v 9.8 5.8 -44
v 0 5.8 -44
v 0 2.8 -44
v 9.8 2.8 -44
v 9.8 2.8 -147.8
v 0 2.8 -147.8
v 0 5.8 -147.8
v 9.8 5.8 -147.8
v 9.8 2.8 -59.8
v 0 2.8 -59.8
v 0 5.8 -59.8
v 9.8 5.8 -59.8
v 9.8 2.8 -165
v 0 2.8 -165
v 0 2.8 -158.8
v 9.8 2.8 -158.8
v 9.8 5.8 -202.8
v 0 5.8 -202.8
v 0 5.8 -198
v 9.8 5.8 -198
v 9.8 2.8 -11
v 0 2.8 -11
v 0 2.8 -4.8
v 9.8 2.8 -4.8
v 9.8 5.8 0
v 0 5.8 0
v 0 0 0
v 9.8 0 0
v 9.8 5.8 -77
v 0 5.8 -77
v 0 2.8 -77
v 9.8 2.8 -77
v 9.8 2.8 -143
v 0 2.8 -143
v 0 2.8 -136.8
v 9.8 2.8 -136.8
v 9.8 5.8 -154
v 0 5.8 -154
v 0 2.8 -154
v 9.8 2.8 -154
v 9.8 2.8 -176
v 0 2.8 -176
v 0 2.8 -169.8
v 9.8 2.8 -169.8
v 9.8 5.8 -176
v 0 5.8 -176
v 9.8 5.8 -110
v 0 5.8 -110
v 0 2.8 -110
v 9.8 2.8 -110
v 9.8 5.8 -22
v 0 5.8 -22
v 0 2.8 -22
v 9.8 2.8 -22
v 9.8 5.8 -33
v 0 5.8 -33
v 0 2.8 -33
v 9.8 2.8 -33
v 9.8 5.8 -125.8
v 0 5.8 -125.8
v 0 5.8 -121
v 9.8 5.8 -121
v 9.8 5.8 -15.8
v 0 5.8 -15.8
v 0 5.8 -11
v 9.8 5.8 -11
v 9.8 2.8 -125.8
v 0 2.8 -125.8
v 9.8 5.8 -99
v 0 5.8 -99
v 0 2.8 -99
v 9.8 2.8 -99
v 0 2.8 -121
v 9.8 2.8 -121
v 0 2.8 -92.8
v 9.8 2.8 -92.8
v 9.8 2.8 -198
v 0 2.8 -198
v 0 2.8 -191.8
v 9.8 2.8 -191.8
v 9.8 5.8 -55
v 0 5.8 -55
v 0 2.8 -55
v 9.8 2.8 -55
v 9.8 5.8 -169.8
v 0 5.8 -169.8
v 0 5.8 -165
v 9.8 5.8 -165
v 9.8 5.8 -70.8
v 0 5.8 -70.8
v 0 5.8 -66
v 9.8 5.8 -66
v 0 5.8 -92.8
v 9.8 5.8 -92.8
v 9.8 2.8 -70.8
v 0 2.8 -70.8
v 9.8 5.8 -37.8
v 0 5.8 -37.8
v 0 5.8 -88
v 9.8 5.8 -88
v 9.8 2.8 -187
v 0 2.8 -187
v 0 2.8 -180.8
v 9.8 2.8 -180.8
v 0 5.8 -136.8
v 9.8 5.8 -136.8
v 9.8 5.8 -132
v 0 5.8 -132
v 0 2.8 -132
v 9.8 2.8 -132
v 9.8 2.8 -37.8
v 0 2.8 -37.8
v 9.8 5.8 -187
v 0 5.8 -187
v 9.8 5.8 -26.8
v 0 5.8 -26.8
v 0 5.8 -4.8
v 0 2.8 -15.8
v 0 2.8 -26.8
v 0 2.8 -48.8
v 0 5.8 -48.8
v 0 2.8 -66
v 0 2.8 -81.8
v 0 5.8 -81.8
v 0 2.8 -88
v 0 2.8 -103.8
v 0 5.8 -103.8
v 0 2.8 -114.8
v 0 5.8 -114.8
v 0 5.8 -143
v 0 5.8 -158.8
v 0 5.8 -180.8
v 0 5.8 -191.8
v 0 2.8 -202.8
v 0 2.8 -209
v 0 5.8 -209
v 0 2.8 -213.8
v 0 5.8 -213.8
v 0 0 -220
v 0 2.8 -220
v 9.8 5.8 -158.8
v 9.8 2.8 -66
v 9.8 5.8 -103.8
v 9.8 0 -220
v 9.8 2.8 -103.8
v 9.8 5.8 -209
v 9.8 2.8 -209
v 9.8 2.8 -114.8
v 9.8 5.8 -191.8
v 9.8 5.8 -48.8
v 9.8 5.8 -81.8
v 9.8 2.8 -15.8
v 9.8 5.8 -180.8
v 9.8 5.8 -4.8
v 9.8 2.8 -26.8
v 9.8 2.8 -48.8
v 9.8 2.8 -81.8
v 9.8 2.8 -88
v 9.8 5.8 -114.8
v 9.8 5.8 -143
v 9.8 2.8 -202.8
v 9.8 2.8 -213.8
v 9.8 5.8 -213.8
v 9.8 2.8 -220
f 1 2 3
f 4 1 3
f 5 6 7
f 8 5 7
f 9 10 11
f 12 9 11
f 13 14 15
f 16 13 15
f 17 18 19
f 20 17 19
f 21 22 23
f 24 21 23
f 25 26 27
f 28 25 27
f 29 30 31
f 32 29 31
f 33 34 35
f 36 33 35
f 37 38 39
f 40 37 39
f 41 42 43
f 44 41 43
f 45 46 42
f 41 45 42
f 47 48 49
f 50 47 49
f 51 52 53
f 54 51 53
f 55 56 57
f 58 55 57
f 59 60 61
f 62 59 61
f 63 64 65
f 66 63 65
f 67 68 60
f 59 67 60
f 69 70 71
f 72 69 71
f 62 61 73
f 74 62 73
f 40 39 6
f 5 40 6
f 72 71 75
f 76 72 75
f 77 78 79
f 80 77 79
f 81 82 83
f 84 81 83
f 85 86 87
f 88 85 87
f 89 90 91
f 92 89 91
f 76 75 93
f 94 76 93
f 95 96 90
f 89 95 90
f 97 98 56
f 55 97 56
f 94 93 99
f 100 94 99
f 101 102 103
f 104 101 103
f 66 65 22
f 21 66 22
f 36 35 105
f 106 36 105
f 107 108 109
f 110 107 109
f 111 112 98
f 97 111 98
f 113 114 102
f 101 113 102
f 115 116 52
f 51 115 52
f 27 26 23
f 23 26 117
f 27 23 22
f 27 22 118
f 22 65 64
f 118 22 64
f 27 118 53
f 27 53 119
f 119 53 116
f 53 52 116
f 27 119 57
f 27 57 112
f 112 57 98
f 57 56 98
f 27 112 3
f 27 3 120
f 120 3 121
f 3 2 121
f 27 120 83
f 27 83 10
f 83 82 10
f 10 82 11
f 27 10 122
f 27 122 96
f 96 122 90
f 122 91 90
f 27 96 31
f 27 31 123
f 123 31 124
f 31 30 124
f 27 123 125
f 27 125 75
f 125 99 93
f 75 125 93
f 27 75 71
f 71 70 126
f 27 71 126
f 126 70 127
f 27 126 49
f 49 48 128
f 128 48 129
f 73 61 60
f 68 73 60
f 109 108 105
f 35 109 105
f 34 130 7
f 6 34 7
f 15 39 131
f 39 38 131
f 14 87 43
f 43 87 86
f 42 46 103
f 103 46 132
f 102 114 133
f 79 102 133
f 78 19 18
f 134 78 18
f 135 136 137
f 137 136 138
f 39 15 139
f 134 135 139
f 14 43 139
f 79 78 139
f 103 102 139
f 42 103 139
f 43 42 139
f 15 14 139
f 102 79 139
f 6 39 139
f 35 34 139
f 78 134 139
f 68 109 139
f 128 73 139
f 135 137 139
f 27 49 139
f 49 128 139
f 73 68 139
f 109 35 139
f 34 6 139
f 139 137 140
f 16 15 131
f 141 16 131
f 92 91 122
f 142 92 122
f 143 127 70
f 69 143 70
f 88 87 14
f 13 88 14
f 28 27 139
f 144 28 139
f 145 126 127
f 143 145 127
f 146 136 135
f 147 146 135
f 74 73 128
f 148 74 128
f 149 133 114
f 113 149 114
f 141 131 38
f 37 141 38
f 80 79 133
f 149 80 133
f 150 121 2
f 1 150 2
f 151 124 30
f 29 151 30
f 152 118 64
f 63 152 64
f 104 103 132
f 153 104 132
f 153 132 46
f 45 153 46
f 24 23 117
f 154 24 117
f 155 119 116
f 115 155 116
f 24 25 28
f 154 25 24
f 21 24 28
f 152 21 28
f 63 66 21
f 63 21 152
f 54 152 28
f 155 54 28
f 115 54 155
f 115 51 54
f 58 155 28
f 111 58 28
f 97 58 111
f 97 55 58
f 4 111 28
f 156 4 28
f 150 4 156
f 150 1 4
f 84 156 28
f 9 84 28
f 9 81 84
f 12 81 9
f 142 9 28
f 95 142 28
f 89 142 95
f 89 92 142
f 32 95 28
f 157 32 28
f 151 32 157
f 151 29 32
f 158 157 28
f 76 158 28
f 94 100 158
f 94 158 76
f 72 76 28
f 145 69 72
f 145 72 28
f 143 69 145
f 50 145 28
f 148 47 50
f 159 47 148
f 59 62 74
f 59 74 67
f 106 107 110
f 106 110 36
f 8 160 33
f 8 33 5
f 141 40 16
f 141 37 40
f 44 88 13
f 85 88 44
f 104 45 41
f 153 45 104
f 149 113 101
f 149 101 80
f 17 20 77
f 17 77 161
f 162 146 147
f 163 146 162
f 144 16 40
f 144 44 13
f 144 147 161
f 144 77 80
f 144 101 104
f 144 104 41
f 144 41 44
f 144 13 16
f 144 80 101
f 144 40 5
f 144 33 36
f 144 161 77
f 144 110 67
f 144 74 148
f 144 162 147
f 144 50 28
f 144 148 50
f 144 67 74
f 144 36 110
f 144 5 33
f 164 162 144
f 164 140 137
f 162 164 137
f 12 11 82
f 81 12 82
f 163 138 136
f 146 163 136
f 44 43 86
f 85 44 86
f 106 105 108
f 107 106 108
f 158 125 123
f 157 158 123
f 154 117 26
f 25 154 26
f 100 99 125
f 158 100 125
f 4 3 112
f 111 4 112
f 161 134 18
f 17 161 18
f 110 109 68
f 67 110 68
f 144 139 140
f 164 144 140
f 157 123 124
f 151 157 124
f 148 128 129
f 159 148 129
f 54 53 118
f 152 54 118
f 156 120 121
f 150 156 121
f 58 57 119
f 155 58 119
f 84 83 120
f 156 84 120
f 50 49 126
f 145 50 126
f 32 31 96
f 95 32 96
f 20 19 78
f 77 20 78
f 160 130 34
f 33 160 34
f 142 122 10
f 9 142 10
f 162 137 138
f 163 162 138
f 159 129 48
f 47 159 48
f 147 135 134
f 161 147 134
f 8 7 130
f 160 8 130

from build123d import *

# Parameters (mm, degrees)
BOSS_EXTRUDE1_DEPTH = 9.8
LPATTERN1_COUNT     = 20
LPATTERN1_PITCH     = 11


with BuildPart() as part:
    # Sketch1 → Boss-Extrude1 (new body)
    with BuildSketch(Plane(origin=(0, 0, 0), x_dir=(0, 0, -1), z_dir=(1, 0, 0))):
        Polygon((0, 0), (4.8, 0), (11, 0), (11, 2.8), (4.8, 2.8), (4.8, 5.8), (0, 5.8), align=None)
    boss_extrude1 = extrude(amount=BOSS_EXTRUDE1_DEPTH)

    # LPattern1: Boss-Extrude1 ×20
    with Locations(*[(0, 0, -i * LPATTERN1_PITCH) for i in range(1, LPATTERN1_COUNT)]):
        add(boss_extrude1)


solid = part.part
